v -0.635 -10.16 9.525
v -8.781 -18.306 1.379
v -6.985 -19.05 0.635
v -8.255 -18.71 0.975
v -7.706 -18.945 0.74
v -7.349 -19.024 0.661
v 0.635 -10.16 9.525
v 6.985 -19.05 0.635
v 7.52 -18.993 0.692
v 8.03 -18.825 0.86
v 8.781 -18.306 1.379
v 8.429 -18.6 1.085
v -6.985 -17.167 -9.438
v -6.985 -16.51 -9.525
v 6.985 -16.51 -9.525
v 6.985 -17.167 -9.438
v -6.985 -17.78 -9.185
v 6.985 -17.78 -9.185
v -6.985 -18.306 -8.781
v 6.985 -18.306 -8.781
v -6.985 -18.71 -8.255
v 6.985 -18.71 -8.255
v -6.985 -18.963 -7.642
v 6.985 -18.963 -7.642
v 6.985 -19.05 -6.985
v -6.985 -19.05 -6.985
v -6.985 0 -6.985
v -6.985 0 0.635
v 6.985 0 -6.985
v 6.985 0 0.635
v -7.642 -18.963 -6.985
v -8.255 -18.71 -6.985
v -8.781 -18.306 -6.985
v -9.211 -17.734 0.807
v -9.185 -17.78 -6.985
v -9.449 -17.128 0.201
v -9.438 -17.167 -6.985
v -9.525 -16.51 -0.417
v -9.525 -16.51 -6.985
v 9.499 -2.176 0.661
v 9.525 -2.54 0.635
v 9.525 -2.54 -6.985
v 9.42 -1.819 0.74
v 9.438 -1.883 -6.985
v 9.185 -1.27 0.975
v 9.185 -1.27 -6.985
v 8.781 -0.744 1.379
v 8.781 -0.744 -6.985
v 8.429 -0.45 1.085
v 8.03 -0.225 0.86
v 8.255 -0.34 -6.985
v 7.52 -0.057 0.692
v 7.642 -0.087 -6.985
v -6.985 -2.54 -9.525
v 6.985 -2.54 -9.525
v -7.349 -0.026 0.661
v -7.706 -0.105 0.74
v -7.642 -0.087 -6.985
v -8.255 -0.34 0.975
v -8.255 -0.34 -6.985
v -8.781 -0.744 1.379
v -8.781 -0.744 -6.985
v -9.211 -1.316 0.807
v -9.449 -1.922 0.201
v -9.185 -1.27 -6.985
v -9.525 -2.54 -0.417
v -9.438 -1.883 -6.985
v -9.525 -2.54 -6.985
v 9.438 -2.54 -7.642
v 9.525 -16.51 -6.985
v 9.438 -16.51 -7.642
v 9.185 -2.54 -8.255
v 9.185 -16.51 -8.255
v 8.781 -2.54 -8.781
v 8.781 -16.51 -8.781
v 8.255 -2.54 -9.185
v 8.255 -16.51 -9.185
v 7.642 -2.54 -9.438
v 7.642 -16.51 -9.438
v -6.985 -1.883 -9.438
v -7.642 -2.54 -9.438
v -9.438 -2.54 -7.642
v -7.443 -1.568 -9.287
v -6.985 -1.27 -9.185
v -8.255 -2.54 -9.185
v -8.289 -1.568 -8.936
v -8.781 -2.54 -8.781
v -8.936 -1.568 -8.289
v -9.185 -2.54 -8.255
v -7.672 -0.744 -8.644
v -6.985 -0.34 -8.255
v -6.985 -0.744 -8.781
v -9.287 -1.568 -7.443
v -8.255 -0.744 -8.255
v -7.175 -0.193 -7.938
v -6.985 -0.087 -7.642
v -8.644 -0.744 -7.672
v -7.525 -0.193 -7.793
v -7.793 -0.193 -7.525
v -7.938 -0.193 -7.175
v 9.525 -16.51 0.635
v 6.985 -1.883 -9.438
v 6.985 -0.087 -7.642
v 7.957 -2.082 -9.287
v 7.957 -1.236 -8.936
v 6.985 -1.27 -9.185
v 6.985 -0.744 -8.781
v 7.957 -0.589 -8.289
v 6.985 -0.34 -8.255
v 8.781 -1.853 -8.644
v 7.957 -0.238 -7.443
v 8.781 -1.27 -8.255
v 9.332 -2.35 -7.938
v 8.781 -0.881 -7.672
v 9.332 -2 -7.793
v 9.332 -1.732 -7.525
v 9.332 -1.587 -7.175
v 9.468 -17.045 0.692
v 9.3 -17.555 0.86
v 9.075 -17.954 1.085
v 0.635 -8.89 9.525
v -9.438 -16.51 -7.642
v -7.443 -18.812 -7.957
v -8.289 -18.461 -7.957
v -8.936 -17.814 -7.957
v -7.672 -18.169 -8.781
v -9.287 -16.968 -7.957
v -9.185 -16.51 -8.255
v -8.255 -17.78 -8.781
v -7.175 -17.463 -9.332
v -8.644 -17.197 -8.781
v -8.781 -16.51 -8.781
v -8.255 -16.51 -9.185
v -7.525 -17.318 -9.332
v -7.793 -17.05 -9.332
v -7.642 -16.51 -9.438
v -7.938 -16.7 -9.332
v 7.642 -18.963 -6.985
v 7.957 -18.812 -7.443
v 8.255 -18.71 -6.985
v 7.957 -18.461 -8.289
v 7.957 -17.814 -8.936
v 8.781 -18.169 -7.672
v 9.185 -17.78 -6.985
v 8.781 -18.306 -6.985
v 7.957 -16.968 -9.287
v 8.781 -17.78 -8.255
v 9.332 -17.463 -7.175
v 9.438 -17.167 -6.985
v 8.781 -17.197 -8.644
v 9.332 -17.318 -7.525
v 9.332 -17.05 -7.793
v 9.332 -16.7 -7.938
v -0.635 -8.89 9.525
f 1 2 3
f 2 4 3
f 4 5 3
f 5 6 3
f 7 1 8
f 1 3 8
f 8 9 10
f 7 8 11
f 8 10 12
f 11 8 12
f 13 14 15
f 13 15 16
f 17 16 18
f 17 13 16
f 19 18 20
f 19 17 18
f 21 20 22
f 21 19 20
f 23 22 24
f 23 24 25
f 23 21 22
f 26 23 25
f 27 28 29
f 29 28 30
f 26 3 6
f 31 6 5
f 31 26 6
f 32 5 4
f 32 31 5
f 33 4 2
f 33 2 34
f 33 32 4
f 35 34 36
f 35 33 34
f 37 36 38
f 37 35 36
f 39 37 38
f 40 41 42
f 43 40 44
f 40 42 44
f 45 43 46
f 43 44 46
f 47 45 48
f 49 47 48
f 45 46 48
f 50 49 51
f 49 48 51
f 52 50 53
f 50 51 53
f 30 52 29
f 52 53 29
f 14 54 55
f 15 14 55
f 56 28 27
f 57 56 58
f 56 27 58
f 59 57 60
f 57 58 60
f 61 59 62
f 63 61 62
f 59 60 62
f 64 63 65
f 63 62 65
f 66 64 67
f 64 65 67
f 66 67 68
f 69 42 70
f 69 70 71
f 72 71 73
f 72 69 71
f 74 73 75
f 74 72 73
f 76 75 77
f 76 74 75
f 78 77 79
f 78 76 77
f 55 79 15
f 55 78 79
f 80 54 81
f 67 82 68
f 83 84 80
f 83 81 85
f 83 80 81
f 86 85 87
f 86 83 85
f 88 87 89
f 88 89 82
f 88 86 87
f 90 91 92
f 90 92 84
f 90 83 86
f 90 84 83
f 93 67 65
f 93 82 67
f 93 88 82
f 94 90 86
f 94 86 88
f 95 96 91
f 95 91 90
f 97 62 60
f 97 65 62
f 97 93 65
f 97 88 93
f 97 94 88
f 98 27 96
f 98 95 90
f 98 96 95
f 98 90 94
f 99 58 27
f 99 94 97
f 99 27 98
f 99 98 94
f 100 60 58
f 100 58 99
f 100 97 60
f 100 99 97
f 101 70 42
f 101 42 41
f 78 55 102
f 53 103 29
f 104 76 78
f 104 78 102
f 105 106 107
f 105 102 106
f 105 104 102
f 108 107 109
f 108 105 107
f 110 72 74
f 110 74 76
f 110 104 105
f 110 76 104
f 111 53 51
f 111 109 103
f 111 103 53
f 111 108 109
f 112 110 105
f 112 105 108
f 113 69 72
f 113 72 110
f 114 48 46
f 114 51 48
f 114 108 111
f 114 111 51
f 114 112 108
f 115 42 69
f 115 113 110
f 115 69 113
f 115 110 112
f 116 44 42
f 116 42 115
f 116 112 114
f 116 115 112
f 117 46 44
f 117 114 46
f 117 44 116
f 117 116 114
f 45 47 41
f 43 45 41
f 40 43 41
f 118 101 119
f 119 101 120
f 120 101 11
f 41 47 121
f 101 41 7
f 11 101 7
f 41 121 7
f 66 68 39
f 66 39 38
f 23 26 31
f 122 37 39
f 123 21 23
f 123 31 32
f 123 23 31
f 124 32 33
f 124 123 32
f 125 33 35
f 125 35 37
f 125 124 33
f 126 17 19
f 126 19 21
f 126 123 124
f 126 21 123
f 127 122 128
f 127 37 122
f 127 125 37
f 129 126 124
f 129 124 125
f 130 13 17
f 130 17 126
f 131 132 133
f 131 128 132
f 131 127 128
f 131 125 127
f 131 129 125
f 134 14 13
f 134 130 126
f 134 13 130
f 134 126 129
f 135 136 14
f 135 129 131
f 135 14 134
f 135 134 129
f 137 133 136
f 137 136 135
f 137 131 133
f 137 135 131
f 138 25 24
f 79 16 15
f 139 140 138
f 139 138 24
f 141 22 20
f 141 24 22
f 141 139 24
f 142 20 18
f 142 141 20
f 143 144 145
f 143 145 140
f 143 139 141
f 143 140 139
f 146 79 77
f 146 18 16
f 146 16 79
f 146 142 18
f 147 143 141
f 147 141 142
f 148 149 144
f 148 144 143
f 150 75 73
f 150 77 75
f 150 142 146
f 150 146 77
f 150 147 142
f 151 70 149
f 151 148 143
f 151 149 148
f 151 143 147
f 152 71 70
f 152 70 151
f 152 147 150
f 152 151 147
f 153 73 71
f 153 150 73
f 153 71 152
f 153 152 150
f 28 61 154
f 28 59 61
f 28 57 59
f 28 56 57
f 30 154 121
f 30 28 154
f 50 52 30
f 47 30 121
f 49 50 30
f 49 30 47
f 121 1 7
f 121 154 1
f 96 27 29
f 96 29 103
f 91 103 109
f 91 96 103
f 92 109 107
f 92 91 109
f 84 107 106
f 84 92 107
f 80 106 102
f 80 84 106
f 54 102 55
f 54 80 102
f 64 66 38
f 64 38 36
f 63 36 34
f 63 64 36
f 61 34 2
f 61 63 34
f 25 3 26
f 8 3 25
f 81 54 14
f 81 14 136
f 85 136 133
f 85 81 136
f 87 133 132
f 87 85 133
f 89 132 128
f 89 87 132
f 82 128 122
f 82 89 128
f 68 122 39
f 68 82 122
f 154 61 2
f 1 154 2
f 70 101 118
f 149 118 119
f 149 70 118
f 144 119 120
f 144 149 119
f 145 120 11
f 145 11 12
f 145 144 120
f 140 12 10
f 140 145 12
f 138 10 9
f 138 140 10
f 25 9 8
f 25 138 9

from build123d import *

# Parameters (mm, degrees)
F0_W         = 19.05
F0_H         = 19.05
F1_DEPTH     = 19.05
F2_SIZE      = 8.89
F3_T1_DEPTH  = 13.97
F3_T3_DEPTH  = 13.97
F3_T5_DEPTH  = 24.3105122421
F3_T7_DEPTH  = 13.97
F3_S11_W     = 2.54
F3_S11_H     = 2.54
F3_T12_DEPTH = 2.54
F3_S17_W     = 2.54
F3_S17_H     = 2.54
F3_T18_DEPTH = 2.54
F3_S23_W     = 2.54
F3_S23_H     = 2.54
F3_T24_DEPTH = 2.54
F3_S29_W     = 2.54
F3_S29_H     = 2.54
F3_T30_DEPTH = 2.54


# Not quite as in the source:
# - a fillet or chamfer that OpenCascade refuses, or shapes differently, is made with other operations: its cross-section is extruded or revolved along the edge and cut away or added


with BuildPart() as f1:
    # F0 (on Front) → F1 (new body)
    with BuildSketch(Plane.XZ):
        Rectangle(F0_W, F0_H)
    extrude(amount=F1_DEPTH)

    # F2
    f2_edges = [f1.edges().sort_by_distance(p)[0] for p in [
        (0, -19.05, 9.525),
        (0, 0, 9.525),
        (9.525, -9.525, 9.525),
        (-9.525, -9.525, 9.525),
    ]]
    chamfer(f2_edges, length=F2_SIZE)

    # F3: fillet of radius 2.54 on 9 edges, made by hand

    # F3_s2 → F3_t1 (cut)
    with BuildSketch(Plane.XY.offset(-6.985)):
        with BuildLine():
            ThreePointArc((9.525, -16.51), (8.7810512242, -18.3060512242), (6.985, -19.05))
            Line((6.985, -19.05), (9.525, -19.05))
            Line((9.525, -19.05), (9.525, -16.51))
        make_face()
        with BuildLine():
            ThreePointArc((-6.985, 0), (-8.7810512242, -0.7439487758), (-9.525, -2.54))
            Line((-9.525, -2.54), (-9.525, 0))
            Line((-9.525, 0), (-6.985, 0))
        make_face()
        with BuildLine():
            ThreePointArc((-6.985, -19.05), (-8.7810512242, -18.3060512242), (-9.525, -16.51))
            Line((-9.525, -16.51), (-9.525, -19.05))
            Line((-9.525, -19.05), (-6.985, -19.05))
        make_face()
        with BuildLine():
            ThreePointArc((9.525, -2.54), (8.7810512242, -0.7439487758), (6.985, 0))
            Line((6.985, 0), (9.525, 0))
            Line((9.525, 0), (9.525, -2.54))
        make_face()
    extrude(amount=F3_T1_DEPTH, mode=Mode.SUBTRACT)

    # F3_s4 → F3_t3 (cut)
    with BuildSketch(Plane.YZ.offset(-6.985)):
        with BuildLine():
            ThreePointArc((-16.51, -9.525), (-18.3060512242, -8.7810512242), (-19.05, -6.985))
            Line((-19.05, -6.985), (-19.05, -9.525))
            Line((-19.05, -9.525), (-16.51, -9.525))
        make_face()
        with BuildLine():
            ThreePointArc((0, -6.985), (-0.7439487758, -8.7810512242), (-2.54, -9.525))
            Line((-2.54, -9.525), (0, -9.525))
            Line((0, -9.525), (0, -6.985))
        make_face()
    extrude(amount=F3_T3_DEPTH, mode=Mode.SUBTRACT)

    # F3_s6 → F3_t5 (cut)
    with BuildSketch(Plane.XZ.offset(-2.6302561211)):
        with BuildLine():
            ThreePointArc((-9.525, -0.4171024484), (-9.3316540126, 0.5549134698), (-8.7810512242, 1.3789487758))
            Line((-8.7810512242, 1.3789487758), (-9.525, 0.635))
            Line((-9.525, 0.635), (-9.525, -0.4171024484))
        make_face()
    extrude(amount=F3_T5_DEPTH, mode=Mode.SUBTRACT)

    # F3_s8 → F3_t7 (cut)
    with BuildSketch(Plane.XZ.offset(2.54)):
        with BuildLine():
            ThreePointArc((-6.985, -9.525), (-8.7810512242, -8.7810512242), (-9.525, -6.985))
            Line((-9.525, -6.985), (-9.525, -9.525))
            Line((-9.525, -9.525), (-6.985, -9.525))
        make_face()
        with BuildLine():
            ThreePointArc((9.525, -6.985), (8.7810512242, -8.7810512242), (6.985, -9.525))
            Line((6.985, -9.525), (9.525, -9.525))
            Line((9.525, -9.525), (9.525, -6.985))
        make_face()
    extrude(amount=F3_T7_DEPTH, mode=Mode.SUBTRACT)


with BuildPart() as f3_tool10:
    # F3_s11 → F3_t12 (new body)
    with BuildSketch(Plane.YZ.offset(6.985)):
        with Locations((-17.78, -8.255)):
            Rectangle(F3_S11_W, F3_S11_H)
    extrude(amount=F3_T12_DEPTH)

    # F3_s13 → F3_t14 (revolve, cut)
    with BuildSketch(Plane(origin=(6.985, -16.51, -6.985), x_dir=(0, 0.7071067812, 0.7071067812), z_dir=(0, 0.7071067812, -0.7071067812))):
        with BuildLine():
            ThreePointArc((0, -2.54), (2.54, 0), (0, 2.54))
            Line((0, 2.54), (0, -2.54))
        make_face()
    revolve(axis=Axis((6.985, -16.51, -6.985), (1, 0, 0)), mode=Mode.SUBTRACT)


with BuildPart() as f1_1:
    add(f1.part)

    # F3_t9: cut F3_tool10
    add(f3_tool10.part, mode=Mode.SUBTRACT)


with BuildPart() as f3_tool16:
    # F3_s17 → F3_t18 (new body)
    with BuildSketch(Plane.XY.offset(-6.985)):
        with Locations((-8.255, -17.78)):
            Rectangle(F3_S17_W, F3_S17_H)
    extrude(amount=-F3_T18_DEPTH)

    # F3_s19 → F3_t20 (revolve, cut)
    with BuildSketch(Plane(origin=(-6.985, -16.51, -6.985), x_dir=(0.7071067812, 0.7071067812, 0), z_dir=(-0.7071067812, 0.7071067812, 0))):
        with BuildLine():
            ThreePointArc((0, -2.54), (2.54, 0), (0, 2.54))
            Line((0, 2.54), (0, -2.54))
        make_face()
    revolve(axis=Axis((-6.985, -16.51, -6.985), (0, 0, -1)), mode=Mode.SUBTRACT)


with BuildPart() as f1_2:
    add(f1_1.part)

    # F3_t15: cut F3_tool16
    add(f3_tool16.part, mode=Mode.SUBTRACT)


with BuildPart() as f3_tool22:
    # F3_s23 → F3_t24 (new body)
    with BuildSketch(Plane.XZ.offset(2.54)):
        with Locations((-8.255, -8.255)):
            Rectangle(F3_S23_W, F3_S23_H)
    extrude(amount=-F3_T24_DEPTH)

    # F3_s25 → F3_t26 (revolve, cut)
    with BuildSketch(Plane(origin=(-6.985, -2.54, -6.985), x_dir=(0.7071067812, 0, 0.7071067812), z_dir=(-0.7071067812, 0, 0.7071067812))):
        with BuildLine():
            ThreePointArc((0, -2.54), (2.54, 0), (0, 2.54))
            Line((0, 2.54), (0, -2.54))
        make_face()
    revolve(axis=Axis((-6.985, -2.54, -6.985), (0, 1, 0)), mode=Mode.SUBTRACT)


with BuildPart() as f1_3:
    add(f1_2.part)

    # F3_t21: cut F3_tool22
    add(f3_tool22.part, mode=Mode.SUBTRACT)


with BuildPart() as f3_tool28:
    # F3_s29 → F3_t30 (new body)
    with BuildSketch(Plane.YZ.offset(6.985)):
        with Locations((-1.27, -8.255)):
            Rectangle(F3_S29_W, F3_S29_H)
    extrude(amount=F3_T30_DEPTH)

    # F3_s31 → F3_t32 (revolve, cut)
    with BuildSketch(Plane(origin=(6.985, -2.54, -6.985), x_dir=(0, -0.7071067812, 0.7071067812), z_dir=(0, 0.7071067812, 0.7071067812))):
        with BuildLine():
            ThreePointArc((0, -2.54), (2.54, 0), (0, 2.54))
            Line((0, 2.54), (0, -2.54))
        make_face()
    revolve(axis=Axis((6.985, -2.54, -6.985), (1, 0, 0)), mode=Mode.SUBTRACT)


with BuildPart() as f1_4:
    add(f1_3.part)

    # F3_t27: cut F3_tool28
    add(f3_tool28.part, mode=Mode.SUBTRACT)


solid = f1_4.part
